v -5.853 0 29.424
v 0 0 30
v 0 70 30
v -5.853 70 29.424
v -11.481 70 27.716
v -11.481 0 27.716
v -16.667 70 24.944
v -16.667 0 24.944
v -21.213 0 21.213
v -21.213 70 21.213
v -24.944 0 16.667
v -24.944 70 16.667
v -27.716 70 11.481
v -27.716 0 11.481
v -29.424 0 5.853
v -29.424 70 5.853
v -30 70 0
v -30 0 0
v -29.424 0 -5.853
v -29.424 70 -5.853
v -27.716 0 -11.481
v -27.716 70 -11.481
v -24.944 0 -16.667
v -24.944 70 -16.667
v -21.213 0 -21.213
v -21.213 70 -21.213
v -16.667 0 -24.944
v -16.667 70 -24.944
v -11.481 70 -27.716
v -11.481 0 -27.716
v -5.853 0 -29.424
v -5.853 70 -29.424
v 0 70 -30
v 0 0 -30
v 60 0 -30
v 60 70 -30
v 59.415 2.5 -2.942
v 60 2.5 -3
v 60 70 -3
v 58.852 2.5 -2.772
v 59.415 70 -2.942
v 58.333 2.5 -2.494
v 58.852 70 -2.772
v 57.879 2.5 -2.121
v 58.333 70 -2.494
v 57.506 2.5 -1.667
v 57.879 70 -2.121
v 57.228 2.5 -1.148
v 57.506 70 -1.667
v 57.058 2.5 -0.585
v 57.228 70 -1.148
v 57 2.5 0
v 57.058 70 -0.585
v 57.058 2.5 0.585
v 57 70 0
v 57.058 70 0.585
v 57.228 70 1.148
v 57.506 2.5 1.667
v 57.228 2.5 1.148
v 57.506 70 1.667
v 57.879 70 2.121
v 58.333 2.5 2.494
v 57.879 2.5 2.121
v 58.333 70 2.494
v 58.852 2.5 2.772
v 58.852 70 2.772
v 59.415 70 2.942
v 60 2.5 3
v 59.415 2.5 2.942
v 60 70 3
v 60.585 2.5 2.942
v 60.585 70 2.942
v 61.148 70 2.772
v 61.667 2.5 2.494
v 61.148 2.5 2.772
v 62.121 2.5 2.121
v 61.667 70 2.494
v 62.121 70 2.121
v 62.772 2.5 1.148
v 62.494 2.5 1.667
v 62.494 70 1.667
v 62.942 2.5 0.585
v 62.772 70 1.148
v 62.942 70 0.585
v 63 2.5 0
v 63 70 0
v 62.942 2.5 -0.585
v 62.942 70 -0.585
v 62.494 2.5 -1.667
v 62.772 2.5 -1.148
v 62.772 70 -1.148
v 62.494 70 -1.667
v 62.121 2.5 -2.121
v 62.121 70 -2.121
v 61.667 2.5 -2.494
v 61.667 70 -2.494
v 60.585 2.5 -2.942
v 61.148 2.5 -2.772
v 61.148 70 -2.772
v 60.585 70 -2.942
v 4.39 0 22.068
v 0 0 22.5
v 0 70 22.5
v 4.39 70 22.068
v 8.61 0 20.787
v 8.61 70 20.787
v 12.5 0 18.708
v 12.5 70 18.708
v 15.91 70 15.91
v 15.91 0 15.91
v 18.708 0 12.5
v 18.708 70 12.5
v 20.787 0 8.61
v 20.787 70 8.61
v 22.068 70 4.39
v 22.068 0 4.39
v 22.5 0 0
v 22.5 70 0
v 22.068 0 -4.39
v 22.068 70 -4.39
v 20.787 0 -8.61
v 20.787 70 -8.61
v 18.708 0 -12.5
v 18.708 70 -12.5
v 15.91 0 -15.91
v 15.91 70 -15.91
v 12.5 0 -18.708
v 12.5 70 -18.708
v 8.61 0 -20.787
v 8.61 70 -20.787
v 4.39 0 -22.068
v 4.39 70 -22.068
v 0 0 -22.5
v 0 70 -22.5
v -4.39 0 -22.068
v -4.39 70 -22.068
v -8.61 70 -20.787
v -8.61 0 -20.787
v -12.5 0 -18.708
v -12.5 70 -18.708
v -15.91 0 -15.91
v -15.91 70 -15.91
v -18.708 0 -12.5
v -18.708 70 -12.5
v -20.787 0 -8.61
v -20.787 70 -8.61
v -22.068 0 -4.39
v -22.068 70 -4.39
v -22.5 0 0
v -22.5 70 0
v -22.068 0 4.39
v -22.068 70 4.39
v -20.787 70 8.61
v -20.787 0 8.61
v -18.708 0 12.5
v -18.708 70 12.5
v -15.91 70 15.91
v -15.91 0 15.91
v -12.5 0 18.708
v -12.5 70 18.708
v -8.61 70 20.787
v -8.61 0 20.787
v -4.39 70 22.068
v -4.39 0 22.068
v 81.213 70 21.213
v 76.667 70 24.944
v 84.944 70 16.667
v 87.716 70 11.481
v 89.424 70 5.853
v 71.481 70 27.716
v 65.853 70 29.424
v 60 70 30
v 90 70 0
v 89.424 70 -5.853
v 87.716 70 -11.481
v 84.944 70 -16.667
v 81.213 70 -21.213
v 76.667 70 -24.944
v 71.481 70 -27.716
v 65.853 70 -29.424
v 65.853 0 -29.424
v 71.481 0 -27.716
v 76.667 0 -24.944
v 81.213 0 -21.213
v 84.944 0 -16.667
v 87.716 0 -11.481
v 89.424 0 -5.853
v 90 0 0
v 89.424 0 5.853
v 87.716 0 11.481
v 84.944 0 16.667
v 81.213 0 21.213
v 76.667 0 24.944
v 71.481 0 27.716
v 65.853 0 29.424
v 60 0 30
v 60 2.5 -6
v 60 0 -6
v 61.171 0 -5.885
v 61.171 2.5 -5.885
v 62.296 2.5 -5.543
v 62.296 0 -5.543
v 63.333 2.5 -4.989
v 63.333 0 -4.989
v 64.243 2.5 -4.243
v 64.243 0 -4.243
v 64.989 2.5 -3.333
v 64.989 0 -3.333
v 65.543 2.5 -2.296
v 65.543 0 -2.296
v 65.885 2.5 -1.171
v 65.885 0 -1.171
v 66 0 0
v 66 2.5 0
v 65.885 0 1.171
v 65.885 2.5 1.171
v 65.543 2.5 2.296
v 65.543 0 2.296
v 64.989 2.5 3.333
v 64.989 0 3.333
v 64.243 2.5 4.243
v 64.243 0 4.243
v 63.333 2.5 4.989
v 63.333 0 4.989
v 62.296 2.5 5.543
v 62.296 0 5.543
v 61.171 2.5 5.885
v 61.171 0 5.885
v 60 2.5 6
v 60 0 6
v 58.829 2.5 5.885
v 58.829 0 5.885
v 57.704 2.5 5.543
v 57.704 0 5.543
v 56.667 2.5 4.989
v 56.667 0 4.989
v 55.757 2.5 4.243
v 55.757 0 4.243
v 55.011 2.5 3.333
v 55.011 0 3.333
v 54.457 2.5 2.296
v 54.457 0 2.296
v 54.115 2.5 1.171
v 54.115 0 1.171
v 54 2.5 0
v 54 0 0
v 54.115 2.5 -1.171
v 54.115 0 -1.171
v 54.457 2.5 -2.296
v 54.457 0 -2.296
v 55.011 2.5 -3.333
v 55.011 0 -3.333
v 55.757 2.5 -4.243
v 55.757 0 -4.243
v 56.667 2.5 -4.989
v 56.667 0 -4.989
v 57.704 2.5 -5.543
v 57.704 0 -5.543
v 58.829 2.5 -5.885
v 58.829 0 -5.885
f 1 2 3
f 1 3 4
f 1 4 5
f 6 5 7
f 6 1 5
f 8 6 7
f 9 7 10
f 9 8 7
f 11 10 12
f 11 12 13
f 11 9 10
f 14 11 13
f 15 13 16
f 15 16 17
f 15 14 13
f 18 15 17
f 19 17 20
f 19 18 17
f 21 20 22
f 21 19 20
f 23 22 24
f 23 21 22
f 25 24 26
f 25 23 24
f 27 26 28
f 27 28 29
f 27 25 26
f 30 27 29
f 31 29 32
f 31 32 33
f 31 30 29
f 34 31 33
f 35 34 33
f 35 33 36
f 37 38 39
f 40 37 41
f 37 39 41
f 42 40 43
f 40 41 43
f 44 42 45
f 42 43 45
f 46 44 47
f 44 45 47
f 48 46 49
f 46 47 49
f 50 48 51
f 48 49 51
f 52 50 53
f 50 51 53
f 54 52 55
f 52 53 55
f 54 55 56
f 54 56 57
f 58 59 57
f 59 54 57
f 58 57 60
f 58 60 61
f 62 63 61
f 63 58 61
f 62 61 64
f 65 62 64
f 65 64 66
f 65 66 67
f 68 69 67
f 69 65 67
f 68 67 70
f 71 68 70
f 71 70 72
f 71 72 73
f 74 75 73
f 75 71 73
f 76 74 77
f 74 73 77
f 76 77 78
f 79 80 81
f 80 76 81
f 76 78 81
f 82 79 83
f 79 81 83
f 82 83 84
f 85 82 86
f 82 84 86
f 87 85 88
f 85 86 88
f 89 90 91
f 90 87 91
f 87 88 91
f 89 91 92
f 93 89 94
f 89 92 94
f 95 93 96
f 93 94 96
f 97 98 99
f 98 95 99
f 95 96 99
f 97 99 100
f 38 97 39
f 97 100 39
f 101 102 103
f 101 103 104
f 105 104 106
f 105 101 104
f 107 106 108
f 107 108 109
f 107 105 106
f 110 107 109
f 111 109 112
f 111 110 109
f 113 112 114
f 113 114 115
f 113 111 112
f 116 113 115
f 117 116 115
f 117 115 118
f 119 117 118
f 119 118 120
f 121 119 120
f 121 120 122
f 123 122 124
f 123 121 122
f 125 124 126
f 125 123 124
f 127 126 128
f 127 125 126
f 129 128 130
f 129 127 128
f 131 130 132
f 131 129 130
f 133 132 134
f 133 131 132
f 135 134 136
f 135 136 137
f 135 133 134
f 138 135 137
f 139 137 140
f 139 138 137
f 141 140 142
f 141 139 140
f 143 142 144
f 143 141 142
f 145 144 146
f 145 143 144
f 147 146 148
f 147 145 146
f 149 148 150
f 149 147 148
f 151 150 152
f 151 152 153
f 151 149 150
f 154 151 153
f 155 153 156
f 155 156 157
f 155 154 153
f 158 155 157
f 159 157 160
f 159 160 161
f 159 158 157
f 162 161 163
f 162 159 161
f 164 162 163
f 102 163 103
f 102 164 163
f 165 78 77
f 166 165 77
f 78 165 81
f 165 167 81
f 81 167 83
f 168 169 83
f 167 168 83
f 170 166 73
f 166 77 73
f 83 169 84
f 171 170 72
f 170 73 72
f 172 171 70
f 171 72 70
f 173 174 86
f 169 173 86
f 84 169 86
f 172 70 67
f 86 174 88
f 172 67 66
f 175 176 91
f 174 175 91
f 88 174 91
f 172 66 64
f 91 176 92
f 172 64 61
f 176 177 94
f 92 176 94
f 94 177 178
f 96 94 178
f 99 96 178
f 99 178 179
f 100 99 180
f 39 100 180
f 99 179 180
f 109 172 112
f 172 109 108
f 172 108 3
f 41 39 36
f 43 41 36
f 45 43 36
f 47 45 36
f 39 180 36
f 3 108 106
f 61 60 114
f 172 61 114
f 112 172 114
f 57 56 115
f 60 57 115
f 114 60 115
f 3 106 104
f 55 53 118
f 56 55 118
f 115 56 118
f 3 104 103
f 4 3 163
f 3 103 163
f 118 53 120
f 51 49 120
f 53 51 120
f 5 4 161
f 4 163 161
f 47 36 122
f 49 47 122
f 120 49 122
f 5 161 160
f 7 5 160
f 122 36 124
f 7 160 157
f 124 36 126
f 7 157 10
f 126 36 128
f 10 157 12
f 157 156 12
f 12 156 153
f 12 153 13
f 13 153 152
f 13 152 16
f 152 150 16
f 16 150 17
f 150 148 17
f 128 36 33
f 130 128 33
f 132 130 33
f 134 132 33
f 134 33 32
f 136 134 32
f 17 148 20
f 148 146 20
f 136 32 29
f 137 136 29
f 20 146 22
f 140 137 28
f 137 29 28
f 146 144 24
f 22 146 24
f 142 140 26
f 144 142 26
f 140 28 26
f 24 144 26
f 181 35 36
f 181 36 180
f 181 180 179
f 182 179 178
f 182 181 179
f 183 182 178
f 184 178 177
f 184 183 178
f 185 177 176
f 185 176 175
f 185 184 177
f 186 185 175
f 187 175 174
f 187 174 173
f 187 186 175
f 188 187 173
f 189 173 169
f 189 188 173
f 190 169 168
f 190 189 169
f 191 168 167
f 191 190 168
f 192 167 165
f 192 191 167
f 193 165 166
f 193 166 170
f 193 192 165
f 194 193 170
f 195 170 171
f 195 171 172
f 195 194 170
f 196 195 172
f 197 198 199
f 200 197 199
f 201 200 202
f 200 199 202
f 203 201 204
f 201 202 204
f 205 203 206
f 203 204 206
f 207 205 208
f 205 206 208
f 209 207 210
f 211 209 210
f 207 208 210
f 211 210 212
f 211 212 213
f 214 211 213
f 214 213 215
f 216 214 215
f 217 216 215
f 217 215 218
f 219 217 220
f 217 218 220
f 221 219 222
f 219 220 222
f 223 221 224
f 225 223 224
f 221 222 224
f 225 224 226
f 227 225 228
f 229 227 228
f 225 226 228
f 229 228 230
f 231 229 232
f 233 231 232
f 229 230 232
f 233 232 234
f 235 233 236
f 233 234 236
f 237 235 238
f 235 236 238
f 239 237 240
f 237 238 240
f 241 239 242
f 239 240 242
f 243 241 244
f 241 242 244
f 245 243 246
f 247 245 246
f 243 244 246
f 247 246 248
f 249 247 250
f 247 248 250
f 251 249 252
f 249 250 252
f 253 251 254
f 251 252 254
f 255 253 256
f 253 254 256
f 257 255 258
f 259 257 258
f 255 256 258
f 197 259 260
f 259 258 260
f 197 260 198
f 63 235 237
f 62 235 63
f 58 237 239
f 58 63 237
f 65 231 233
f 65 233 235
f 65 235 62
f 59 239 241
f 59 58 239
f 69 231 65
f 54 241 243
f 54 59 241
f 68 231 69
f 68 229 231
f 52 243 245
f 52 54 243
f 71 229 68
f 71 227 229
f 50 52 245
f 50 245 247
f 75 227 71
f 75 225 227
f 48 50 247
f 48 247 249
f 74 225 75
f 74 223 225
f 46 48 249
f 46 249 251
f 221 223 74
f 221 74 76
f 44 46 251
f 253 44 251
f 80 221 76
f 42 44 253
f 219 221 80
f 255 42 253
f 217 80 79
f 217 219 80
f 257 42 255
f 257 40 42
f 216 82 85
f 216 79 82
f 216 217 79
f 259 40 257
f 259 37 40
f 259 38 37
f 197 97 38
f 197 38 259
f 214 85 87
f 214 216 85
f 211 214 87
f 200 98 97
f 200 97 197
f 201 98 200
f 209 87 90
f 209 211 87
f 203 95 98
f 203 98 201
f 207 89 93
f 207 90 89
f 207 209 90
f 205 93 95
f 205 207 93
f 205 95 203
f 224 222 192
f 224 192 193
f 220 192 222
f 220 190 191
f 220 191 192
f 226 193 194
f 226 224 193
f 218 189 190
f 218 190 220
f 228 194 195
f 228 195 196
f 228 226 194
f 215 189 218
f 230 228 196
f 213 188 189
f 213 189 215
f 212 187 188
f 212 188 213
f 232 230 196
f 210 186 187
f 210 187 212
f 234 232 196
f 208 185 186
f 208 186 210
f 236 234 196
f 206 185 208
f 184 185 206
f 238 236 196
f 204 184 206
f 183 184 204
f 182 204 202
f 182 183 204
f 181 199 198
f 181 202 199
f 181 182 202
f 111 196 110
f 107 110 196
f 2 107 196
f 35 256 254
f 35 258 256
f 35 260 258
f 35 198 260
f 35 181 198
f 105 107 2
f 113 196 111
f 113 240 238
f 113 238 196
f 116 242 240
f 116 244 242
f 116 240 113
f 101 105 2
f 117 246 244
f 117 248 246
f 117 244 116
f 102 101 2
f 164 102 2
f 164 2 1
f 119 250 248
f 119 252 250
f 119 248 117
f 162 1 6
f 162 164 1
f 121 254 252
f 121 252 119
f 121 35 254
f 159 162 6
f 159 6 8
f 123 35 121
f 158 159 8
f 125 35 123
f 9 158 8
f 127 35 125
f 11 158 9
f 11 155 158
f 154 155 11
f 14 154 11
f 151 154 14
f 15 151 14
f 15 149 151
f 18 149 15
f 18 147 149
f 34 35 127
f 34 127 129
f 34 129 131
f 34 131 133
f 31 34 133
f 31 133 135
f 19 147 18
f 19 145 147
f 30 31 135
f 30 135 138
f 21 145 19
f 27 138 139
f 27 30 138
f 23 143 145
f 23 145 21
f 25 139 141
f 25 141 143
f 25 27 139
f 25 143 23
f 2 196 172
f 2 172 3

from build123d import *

# Parameters (mm, degrees)
SKETCH3_R           = 22.5
BOSS_EXTRUDE1_DEPTH = 70
SKETCH4_R           = 6
CUT_EXTRUDE1_DEPTH  = 2.5
SKETCH6_R           = 3
CUT_EXTRUDE2_DEPTH  = 6
SKETCH7_R           = 3
CUT_EXTRUDE3_DEPTH  = 118.898261226


with BuildPart() as part:
    # Sketch3 → Boss-Extrude1 (new body)
    with BuildSketch(Plane(origin=(0, 0, 0), x_dir=(1, 0, 0), z_dir=(0, 1, 0))):
        with BuildLine():
            Line((0, 30), (60, 30))
            ThreePointArc((60, 30), (90, 0), (60, -30))
            Line((60, -30), (0, -30))
            ThreePointArc((0, -30), (-30, 0), (0, 30))
        make_face()
        with Locations(Location((0, 0, 0), (0, 0, 270))):
            Circle(SKETCH3_R, mode=Mode.SUBTRACT)
    extrude(amount=BOSS_EXTRUDE1_DEPTH)

    # Sketch4 → Cut-Extrude1 (cut)
    with BuildSketch(Plane.XZ):
        with Locations(Location((60, 0, 0), (0, 0, 270))):
            Circle(SKETCH4_R)
    extrude(amount=-CUT_EXTRUDE1_DEPTH, mode=Mode.SUBTRACT)

    # Sketch6 → Cut-Extrude2 (cut)
    with BuildSketch(Plane.XZ):
        with Locations(Location((60, 0, 0), (0, 0, 270))):
            Circle(SKETCH6_R)
    extrude(amount=-CUT_EXTRUDE2_DEPTH, mode=Mode.SUBTRACT)

    # Sketch7 → Cut-Extrude3 (cut, through all)
    with BuildSketch(Plane(origin=(0, 70, 0), x_dir=(1, 0, 0), z_dir=(0, 1, 0))):
        with Locations(Location((60, 0, 0), (0, 0, 90))):
            Circle(SKETCH7_R)
    extrude(amount=-CUT_EXTRUDE3_DEPTH, mode=Mode.SUBTRACT)


solid = part.part
